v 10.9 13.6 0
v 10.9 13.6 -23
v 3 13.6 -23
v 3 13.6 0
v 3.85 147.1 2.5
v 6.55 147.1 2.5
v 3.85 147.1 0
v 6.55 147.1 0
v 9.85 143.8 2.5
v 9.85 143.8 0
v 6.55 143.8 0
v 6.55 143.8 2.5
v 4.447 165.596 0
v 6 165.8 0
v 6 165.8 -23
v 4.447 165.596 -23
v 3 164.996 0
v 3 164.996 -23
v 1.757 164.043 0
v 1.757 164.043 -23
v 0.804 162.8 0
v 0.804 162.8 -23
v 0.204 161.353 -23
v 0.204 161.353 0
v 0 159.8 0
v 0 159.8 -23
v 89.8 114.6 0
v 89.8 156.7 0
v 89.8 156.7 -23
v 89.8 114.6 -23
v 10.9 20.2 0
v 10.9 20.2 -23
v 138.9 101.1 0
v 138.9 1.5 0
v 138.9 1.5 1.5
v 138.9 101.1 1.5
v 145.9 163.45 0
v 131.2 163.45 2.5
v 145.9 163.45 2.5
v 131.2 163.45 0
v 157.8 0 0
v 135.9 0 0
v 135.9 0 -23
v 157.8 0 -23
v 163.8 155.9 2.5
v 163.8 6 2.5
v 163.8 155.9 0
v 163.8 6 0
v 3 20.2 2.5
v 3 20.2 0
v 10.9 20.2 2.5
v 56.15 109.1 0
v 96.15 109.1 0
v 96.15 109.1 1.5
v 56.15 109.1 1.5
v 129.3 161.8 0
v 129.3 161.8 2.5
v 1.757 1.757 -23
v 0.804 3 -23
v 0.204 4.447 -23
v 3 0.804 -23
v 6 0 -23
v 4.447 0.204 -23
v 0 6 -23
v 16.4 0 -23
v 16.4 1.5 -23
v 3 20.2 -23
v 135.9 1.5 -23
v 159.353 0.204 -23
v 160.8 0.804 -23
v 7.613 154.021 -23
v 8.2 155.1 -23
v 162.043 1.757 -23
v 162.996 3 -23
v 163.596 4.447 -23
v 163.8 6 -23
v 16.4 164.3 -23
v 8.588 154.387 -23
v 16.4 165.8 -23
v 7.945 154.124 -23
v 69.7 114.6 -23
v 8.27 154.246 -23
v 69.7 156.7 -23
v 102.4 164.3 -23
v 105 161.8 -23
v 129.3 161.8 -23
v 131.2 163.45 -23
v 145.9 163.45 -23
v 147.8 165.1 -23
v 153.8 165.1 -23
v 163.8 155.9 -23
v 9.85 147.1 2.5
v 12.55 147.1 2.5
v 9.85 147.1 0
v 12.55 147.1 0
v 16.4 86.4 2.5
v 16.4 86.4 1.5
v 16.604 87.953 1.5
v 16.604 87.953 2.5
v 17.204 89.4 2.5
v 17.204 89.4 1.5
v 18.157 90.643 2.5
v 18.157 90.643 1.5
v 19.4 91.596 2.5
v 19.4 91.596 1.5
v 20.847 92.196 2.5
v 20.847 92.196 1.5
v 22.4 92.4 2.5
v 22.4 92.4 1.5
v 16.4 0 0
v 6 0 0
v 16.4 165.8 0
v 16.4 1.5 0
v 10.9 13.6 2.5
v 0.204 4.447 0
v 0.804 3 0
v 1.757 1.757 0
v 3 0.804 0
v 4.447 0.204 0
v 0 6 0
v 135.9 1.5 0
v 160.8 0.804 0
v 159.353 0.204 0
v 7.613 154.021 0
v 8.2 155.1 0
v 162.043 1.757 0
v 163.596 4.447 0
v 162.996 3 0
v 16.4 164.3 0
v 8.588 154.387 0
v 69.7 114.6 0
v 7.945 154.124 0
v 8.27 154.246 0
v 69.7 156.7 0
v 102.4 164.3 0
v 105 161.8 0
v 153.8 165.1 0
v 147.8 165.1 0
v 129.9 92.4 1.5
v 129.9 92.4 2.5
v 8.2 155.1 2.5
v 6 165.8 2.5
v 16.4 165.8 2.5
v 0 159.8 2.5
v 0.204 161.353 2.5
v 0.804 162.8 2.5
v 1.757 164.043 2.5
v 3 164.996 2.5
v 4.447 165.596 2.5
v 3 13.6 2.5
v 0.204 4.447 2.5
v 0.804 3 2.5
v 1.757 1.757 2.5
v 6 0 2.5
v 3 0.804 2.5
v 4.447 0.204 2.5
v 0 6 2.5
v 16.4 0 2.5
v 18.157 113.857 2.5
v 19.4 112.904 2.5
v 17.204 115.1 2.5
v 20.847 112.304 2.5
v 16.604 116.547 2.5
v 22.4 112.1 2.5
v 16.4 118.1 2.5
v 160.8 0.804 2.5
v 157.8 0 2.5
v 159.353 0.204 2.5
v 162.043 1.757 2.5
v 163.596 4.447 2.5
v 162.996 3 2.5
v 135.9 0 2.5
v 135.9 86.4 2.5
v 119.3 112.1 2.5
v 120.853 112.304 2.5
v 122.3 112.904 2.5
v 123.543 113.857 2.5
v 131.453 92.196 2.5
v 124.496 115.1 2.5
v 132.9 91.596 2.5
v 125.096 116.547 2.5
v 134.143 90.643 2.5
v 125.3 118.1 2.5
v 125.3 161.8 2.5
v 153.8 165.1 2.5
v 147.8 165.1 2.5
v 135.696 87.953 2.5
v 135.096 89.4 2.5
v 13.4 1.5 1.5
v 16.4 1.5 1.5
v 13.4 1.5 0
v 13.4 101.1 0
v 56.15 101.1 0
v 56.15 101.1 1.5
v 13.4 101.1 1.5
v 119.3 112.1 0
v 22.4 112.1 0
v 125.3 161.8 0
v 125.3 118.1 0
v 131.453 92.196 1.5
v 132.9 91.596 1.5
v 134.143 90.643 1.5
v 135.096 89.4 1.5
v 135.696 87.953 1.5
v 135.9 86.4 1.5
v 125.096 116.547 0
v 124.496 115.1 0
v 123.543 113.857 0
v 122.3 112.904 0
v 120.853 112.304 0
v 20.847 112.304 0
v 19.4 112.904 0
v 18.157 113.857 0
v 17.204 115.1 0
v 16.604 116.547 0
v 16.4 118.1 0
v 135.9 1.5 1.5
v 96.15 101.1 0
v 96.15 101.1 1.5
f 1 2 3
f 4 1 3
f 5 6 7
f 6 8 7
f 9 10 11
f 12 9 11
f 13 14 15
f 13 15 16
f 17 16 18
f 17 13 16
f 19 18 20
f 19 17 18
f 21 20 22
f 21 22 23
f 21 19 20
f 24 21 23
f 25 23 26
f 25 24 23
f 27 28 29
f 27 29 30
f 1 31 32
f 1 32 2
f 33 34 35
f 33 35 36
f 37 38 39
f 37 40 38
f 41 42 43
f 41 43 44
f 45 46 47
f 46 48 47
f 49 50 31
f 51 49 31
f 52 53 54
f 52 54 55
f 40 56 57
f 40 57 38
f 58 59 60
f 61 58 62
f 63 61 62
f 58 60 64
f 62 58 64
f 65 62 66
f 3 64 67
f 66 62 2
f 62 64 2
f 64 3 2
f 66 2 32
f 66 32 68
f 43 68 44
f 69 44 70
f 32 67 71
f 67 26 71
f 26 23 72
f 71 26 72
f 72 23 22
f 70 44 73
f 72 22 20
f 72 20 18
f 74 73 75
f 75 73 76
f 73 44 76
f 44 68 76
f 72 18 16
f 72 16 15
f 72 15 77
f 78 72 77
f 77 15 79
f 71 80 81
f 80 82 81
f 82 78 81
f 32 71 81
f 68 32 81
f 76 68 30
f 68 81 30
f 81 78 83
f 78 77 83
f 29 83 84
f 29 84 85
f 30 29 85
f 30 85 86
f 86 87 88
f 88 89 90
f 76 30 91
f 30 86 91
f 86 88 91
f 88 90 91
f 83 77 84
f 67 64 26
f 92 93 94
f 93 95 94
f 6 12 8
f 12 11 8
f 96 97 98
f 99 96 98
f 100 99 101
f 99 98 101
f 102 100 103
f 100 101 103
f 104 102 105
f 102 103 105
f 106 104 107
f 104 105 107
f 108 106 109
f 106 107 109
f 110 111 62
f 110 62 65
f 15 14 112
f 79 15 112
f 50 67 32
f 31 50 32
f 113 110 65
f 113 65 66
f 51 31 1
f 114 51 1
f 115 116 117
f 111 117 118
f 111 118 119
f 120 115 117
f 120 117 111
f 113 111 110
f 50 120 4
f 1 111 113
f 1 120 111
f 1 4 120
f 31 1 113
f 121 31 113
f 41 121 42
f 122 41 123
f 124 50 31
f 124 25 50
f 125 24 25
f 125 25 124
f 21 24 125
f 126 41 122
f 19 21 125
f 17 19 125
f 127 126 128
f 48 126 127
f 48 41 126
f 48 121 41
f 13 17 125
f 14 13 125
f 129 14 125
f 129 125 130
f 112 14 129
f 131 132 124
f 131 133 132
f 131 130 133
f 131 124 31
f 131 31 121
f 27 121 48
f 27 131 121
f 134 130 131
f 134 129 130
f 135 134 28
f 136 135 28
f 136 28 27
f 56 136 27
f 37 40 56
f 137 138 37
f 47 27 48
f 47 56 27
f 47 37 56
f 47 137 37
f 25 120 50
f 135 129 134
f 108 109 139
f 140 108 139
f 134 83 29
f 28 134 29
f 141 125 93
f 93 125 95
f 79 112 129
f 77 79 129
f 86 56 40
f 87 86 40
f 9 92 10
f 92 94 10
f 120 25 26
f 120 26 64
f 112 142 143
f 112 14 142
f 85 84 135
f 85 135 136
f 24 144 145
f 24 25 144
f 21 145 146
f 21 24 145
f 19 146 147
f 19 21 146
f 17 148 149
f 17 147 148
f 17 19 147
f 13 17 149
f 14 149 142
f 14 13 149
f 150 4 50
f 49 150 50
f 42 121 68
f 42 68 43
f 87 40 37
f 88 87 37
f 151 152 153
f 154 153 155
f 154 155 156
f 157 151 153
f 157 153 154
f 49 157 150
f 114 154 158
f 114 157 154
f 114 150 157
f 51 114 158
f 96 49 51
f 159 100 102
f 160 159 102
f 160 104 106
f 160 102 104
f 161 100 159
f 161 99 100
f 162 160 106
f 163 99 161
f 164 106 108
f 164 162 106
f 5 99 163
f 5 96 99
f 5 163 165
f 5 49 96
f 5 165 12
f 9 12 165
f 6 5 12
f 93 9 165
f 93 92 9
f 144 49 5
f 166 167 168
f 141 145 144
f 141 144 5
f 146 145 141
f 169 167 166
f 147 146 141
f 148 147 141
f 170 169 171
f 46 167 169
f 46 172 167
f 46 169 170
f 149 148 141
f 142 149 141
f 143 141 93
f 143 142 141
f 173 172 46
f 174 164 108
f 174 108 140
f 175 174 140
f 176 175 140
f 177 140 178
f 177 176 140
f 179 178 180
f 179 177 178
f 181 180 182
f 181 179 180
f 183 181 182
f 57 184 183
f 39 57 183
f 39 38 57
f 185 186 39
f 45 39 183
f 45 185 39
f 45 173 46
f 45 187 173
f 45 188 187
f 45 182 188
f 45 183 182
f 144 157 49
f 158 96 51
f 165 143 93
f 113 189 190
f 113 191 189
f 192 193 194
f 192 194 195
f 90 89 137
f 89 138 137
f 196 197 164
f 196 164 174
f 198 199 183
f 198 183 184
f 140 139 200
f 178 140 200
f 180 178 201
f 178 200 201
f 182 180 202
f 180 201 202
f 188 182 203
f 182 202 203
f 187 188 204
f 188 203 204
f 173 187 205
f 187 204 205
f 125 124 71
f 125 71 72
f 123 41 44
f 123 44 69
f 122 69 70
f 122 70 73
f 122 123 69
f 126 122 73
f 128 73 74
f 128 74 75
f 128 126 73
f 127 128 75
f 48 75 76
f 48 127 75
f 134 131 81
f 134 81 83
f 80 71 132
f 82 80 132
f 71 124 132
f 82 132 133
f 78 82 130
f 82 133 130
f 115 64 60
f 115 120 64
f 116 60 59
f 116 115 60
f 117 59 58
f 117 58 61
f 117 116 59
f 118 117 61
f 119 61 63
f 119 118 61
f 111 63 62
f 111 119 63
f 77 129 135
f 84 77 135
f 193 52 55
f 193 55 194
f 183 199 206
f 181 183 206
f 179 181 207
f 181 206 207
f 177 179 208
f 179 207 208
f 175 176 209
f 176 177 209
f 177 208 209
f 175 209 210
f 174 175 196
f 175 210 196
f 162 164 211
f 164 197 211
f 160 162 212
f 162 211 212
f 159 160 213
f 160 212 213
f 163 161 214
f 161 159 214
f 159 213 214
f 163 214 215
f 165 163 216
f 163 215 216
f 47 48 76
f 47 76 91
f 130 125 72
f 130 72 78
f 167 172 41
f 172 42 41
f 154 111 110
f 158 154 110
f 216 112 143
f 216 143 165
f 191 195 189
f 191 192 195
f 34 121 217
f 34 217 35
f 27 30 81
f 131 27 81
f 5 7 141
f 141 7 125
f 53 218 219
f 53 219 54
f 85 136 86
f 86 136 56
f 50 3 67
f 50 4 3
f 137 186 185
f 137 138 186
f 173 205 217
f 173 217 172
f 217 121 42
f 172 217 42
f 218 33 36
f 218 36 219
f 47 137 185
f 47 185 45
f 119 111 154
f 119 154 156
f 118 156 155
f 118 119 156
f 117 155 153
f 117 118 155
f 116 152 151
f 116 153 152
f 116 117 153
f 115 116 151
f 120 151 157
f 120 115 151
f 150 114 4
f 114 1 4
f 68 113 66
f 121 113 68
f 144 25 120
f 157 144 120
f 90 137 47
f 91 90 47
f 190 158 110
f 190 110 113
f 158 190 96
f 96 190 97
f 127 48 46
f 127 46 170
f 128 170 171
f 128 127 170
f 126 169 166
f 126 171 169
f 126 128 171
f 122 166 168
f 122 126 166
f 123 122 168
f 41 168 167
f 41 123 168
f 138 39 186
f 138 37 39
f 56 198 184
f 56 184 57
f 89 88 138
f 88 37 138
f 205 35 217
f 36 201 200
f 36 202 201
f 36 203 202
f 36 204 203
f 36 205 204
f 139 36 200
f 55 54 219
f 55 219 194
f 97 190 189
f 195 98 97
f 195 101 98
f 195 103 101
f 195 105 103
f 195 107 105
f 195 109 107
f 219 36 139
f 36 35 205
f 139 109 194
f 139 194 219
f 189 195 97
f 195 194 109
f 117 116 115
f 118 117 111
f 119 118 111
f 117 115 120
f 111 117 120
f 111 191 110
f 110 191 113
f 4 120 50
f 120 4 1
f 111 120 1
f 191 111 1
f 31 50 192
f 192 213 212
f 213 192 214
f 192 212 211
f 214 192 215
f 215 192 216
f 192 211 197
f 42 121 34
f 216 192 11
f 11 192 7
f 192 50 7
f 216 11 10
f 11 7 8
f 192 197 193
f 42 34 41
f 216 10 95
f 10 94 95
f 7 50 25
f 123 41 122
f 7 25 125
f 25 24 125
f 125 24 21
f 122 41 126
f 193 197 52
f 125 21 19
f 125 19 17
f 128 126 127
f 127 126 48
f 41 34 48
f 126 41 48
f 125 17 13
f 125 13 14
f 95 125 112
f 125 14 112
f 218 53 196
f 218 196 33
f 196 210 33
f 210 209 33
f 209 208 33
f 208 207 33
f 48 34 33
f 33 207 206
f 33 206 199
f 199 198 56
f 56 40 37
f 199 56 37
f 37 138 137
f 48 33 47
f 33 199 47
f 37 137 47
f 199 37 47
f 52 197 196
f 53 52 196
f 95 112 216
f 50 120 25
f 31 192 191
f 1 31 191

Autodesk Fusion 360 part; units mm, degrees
sketch "Sketch Floppy Disk" plane through (0, 0, 0) normal (0, 0, 1) x (1, 0, 0)
  line L0 (163.8, 0) -> (163.8, 155.9)
  line L1 (0, 165.8) -> (0, 0)
  line L2 (0, 165.8) -> (16.4, 165.8)
  line L3 (16.4, 165.8) -> (16.4, 118.1)
  line L4 (22.4, 112.1) -> (119.3, 112.1)
  line L5 (125.3, 118.1) -> (125.3, 161.8)
  line L6 (0, 0) -> (16.4, 0)
  line L7 (16.4, 0) -> (16.4, 86.4)
  line L8 (22.4, 92.4) -> (129.9, 92.4)
  line L9 (135.9, 86.4) -> (135.9, 0)
  line L10 (135.9, 0) -> (163.8, 0)
  line L11 (125.3, 161.8) -> (129.3, 161.8)
  line L12 (129.3, 161.8) -> (131.2, 163.45)
  line L13 (131.2, 163.45) -> (145.9, 163.45)
  line L14 (145.9, 163.45) -> (147.8, 165.1)
  line L15 (147.8, 165.1) -> (153.8, 165.1)
  line L16 (153.8, 165.1) -> (163.8, 155.9)
  line L17 (16.4, 164.3) -> (102.4, 164.3)
  line L18 (102.4, 164.3) -> (105, 161.8)
  line L19 (105, 161.8) -> (125.3, 161.8)
  line L20 (16.4, 1.5) -> (135.9, 1.5)
  line L21 (3, 20.2) -> (10.9, 20.2)
  line L22 (10.9, 20.2) -> (10.9, 13.6)
  line L23 (10.9, 13.6) -> (3, 13.6)
  line L24 (3, 13.6) -> (3, 20.2)
  line L25 (6.55, 143.8) -> (6.55, 147.1)
  line L26 (6.55, 147.1) -> (3.85, 147.1)
  line L27 (3.85, 147.1) -> (8.2, 155.1)
  line L28 (8.2, 155.1) -> (12.55, 147.1)
  line L29 (12.55, 147.1) -> (9.85, 147.1)
  line L30 (9.85, 147.1) -> (9.85, 143.8)
  line L31 (9.85, 143.8) -> (6.55, 143.8)
  line L32 (6.55, 143.8) -> (0, 143.8) construction
  line L33 (9.85, 143.8) -> (16.4, 143.8) construction
  circle A0 centre (157.8, 6) radius 6
  circle A1 centre (6, 6) radius 6
  circle A2 centre (6, 159.8) radius 6
  arc A3 (22.4, 92.4) -> (16.4, 86.4) centre (22.4, 86.4) ccw
  arc A4 (135.9, 86.4) -> (129.9, 92.4) centre (129.9, 86.4) ccw
  line L34 (69.7, 156.7) -> (89.8, 156.7)
  line L35 (89.8, 156.7) -> (89.8, 114.6)
  line L36 (89.8, 114.6) -> (69.7, 114.6)
  line L37 (69.7, 114.6) -> (69.7, 156.7)
  arc A5 (119.3, 112.1) -> (125.3, 118.1) centre (119.3, 118.1) ccw
  arc A6 (16.4, 118.1) -> (22.4, 112.1) centre (22.4, 118.1) ccw
  point P0 (16.4, 112.1)
  point P1 (125.3, 112.1)
  point P2 (16.4, 92.4)
  point P3 (135.9, 92.4)
  dimension "d7" = 16.4
  dimension "d8" = 27.9
  dimension "d9" = 119.5
  dimension "d10" = 108.9
  dimension "d12" = 53.7
  dimension "d13" = 92.4
  dimension "d14" = 14.7
  dimension "d15" = 6
  dimension "d16" = 4
  dimension "d17" = 10
  dimension "d18" = 9.2
  dimension "d19" = 1.5
  dimension "d20" = 165.1
  dimension "d21" = 86
  dimension "d22" = 24.3
  dimension "d23" = 49.7
  dimension "d24" = 1.5
  dimension "d25" = 6.6
  dimension "d26" = 7.9
  dimension "d27" = 13.6
  dimension "d28" = 3
  dimension "d29" = 3.3
  dimension "d30" = 3.3
  dimension "d31" = 2.7
  dimension "d32" = 8
  dimension "d33" = 22
  dimension "d34" = 165.8
  dimension "d37" = 6
  dimension "d38" = 6
  dimension "d39" = 6
  dimension "d40" = 6
  dimension "d41" = 6
  dimension "d54" = 20.1
  dimension "d55" = 42.1
  dimension "d56" = 2.5
  dimension "d57" = 69.7
  dimension "d58" = 6
  dimension "d59" = 6
extrude "Extrude1" add sketch "Sketch Floppy Disk" along normal blind 2.5 contours L0 L1 L2 L3 L4 L5 L6 L7 L8 L9 L10 L11 L12 L13 L14 L15 L16 L25 L26 L27 L28 L29 L30 L31 A0 A1 A2 A3 A4 A5 A6 | A0 | A1 | L27 L28 A2 picked at (4.8212, 161.7351) makes body 1
sketch "Sketch Display Pocket" plane through (0, 0, 0) normal (0, 0, -1) x (-1, 0, 0)
  line L0 (-8.2, 155.1) -> (-3.85, 147.1)
  line L1 (-3.85, 147.1) -> (-6.55, 147.1)
  line L2 (-6.55, 147.1) -> (-6.55, 143.8)
  line L3 (-6.55, 143.8) -> (-9.85, 143.8)
  line L4 (-9.85, 143.8) -> (-9.85, 147.1)
  line L5 (-9.85, 147.1) -> (-12.55, 147.1)
  line L6 (-12.55, 147.1) -> (-8.2, 155.1)
  line L7 (-3, 20.2) -> (-3, 13.6)
  line L8 (-3, 13.6) -> (-10.9, 13.6)
  line L9 (-10.9, 13.6) -> (-10.9, 20.2)
  line L10 (-10.9, 20.2) -> (-3, 20.2)
  arc A0 (-163.8, 6) -> (-157.8, 0) centre (-157.8, 6) ccw
  line L11 (-157.8, 0) -> (-135.9, 0)
  line L12 (-135.9, 0) -> (-135.9, 86.4)
  arc A1 (-129.9, 92.4) -> (-135.9, 86.4) centre (-129.9, 86.4) ccw
  line L13 (-129.9, 92.4) -> (-22.4, 92.4)
  arc A2 (-16.4, 86.4) -> (-22.4, 92.4) centre (-22.4, 86.4) ccw
  line L14 (-16.4, 86.4) -> (-16.4, 0)
  line L15 (-16.4, 0) -> (-6, 0)
  arc A3 (-6, 0) -> (0, 6) centre (-6, 6) ccw
  line L16 (0, 6) -> (0, 159.8)
  arc A4 (0, 159.8) -> (-6, 165.8) centre (-6, 159.8) ccw
  line L17 (-6, 165.8) -> (-16.4, 165.8)
  line L18 (-16.4, 165.8) -> (-16.4, 118.1)
  line L19 (-22.4, 112.1) -> (-119.3, 112.1)
  line L20 (-125.3, 118.1) -> (-125.3, 161.8)
  line L21 (-125.3, 161.8) -> (-129.3, 161.8)
  line L22 (-129.3, 161.8) -> (-131.2, 163.45)
  line L23 (-131.2, 163.45) -> (-145.9, 163.45)
  line L24 (-145.9, 163.45) -> (-147.8, 165.1)
  line L25 (-147.8, 165.1) -> (-153.8, 165.1)
  line L26 (-153.8, 165.1) -> (-163.8, 155.9)
  line L27 (-163.8, 155.9) -> (-163.8, 6)
  line L28 (-138.9, 1.5) -> (-138.9, 101.1)
  line L29 (-138.9, 101.1) -> (-96.15, 101.1)
  line L30 (-96.15, 101.1) -> (-96.15, 109.1)
  line L31 (-96.15, 109.1) -> (-56.15, 109.1)
  line L32 (-56.15, 109.1) -> (-56.15, 101.1)
  line L33 (-56.15, 101.1) -> (-13.4, 101.1)
  line L34 (-13.4, 101.1) -> (-13.4, 1.5)
  line L35 (-13.4, 1.5) -> (-138.9, 1.5)
  arc A5 (-22.4, 112.1) -> (-16.4, 118.1) centre (-22.4, 118.1) ccw
  arc A6 (-125.3, 118.1) -> (-119.3, 112.1) centre (-119.3, 118.1) ccw
  dimension "d46" = 99.6
  dimension "d47" = 125.5
  dimension "d48" = 1.5
  dimension "d49" = 3
  dimension "d50" = 40
  dimension "d51" = 8
extrude "Extrude2" cut sketch "Sketch Display Pocket" against normal blind 1.5 contours L12 A1 L13 A2 L14 L28 L29 L30 L31 L32 L33 L34 L35 bodies 1
extrude "Extrude3" add sketch "Sketch Floppy Disk" against normal blind 23 separate body contours L0 L1 L2 L3 L4 L5 L6 L7 L8 L9 L10 L11 L12 L13 L14 L15 L16 L25 L26 L27 L28 L29 L30 L31 A0 A1 A2 A3 A4 A5 A6 | A0 | L7 L8 L9 L20 A3 A4 | A1 | L3 L4 L5 L17 L18 L19 A5 A6 | L27 L28 A2 | L25 L26 L27 L28 L29 L30 L31 A2 picked at (4.8212, 161.7351) makes body 2
